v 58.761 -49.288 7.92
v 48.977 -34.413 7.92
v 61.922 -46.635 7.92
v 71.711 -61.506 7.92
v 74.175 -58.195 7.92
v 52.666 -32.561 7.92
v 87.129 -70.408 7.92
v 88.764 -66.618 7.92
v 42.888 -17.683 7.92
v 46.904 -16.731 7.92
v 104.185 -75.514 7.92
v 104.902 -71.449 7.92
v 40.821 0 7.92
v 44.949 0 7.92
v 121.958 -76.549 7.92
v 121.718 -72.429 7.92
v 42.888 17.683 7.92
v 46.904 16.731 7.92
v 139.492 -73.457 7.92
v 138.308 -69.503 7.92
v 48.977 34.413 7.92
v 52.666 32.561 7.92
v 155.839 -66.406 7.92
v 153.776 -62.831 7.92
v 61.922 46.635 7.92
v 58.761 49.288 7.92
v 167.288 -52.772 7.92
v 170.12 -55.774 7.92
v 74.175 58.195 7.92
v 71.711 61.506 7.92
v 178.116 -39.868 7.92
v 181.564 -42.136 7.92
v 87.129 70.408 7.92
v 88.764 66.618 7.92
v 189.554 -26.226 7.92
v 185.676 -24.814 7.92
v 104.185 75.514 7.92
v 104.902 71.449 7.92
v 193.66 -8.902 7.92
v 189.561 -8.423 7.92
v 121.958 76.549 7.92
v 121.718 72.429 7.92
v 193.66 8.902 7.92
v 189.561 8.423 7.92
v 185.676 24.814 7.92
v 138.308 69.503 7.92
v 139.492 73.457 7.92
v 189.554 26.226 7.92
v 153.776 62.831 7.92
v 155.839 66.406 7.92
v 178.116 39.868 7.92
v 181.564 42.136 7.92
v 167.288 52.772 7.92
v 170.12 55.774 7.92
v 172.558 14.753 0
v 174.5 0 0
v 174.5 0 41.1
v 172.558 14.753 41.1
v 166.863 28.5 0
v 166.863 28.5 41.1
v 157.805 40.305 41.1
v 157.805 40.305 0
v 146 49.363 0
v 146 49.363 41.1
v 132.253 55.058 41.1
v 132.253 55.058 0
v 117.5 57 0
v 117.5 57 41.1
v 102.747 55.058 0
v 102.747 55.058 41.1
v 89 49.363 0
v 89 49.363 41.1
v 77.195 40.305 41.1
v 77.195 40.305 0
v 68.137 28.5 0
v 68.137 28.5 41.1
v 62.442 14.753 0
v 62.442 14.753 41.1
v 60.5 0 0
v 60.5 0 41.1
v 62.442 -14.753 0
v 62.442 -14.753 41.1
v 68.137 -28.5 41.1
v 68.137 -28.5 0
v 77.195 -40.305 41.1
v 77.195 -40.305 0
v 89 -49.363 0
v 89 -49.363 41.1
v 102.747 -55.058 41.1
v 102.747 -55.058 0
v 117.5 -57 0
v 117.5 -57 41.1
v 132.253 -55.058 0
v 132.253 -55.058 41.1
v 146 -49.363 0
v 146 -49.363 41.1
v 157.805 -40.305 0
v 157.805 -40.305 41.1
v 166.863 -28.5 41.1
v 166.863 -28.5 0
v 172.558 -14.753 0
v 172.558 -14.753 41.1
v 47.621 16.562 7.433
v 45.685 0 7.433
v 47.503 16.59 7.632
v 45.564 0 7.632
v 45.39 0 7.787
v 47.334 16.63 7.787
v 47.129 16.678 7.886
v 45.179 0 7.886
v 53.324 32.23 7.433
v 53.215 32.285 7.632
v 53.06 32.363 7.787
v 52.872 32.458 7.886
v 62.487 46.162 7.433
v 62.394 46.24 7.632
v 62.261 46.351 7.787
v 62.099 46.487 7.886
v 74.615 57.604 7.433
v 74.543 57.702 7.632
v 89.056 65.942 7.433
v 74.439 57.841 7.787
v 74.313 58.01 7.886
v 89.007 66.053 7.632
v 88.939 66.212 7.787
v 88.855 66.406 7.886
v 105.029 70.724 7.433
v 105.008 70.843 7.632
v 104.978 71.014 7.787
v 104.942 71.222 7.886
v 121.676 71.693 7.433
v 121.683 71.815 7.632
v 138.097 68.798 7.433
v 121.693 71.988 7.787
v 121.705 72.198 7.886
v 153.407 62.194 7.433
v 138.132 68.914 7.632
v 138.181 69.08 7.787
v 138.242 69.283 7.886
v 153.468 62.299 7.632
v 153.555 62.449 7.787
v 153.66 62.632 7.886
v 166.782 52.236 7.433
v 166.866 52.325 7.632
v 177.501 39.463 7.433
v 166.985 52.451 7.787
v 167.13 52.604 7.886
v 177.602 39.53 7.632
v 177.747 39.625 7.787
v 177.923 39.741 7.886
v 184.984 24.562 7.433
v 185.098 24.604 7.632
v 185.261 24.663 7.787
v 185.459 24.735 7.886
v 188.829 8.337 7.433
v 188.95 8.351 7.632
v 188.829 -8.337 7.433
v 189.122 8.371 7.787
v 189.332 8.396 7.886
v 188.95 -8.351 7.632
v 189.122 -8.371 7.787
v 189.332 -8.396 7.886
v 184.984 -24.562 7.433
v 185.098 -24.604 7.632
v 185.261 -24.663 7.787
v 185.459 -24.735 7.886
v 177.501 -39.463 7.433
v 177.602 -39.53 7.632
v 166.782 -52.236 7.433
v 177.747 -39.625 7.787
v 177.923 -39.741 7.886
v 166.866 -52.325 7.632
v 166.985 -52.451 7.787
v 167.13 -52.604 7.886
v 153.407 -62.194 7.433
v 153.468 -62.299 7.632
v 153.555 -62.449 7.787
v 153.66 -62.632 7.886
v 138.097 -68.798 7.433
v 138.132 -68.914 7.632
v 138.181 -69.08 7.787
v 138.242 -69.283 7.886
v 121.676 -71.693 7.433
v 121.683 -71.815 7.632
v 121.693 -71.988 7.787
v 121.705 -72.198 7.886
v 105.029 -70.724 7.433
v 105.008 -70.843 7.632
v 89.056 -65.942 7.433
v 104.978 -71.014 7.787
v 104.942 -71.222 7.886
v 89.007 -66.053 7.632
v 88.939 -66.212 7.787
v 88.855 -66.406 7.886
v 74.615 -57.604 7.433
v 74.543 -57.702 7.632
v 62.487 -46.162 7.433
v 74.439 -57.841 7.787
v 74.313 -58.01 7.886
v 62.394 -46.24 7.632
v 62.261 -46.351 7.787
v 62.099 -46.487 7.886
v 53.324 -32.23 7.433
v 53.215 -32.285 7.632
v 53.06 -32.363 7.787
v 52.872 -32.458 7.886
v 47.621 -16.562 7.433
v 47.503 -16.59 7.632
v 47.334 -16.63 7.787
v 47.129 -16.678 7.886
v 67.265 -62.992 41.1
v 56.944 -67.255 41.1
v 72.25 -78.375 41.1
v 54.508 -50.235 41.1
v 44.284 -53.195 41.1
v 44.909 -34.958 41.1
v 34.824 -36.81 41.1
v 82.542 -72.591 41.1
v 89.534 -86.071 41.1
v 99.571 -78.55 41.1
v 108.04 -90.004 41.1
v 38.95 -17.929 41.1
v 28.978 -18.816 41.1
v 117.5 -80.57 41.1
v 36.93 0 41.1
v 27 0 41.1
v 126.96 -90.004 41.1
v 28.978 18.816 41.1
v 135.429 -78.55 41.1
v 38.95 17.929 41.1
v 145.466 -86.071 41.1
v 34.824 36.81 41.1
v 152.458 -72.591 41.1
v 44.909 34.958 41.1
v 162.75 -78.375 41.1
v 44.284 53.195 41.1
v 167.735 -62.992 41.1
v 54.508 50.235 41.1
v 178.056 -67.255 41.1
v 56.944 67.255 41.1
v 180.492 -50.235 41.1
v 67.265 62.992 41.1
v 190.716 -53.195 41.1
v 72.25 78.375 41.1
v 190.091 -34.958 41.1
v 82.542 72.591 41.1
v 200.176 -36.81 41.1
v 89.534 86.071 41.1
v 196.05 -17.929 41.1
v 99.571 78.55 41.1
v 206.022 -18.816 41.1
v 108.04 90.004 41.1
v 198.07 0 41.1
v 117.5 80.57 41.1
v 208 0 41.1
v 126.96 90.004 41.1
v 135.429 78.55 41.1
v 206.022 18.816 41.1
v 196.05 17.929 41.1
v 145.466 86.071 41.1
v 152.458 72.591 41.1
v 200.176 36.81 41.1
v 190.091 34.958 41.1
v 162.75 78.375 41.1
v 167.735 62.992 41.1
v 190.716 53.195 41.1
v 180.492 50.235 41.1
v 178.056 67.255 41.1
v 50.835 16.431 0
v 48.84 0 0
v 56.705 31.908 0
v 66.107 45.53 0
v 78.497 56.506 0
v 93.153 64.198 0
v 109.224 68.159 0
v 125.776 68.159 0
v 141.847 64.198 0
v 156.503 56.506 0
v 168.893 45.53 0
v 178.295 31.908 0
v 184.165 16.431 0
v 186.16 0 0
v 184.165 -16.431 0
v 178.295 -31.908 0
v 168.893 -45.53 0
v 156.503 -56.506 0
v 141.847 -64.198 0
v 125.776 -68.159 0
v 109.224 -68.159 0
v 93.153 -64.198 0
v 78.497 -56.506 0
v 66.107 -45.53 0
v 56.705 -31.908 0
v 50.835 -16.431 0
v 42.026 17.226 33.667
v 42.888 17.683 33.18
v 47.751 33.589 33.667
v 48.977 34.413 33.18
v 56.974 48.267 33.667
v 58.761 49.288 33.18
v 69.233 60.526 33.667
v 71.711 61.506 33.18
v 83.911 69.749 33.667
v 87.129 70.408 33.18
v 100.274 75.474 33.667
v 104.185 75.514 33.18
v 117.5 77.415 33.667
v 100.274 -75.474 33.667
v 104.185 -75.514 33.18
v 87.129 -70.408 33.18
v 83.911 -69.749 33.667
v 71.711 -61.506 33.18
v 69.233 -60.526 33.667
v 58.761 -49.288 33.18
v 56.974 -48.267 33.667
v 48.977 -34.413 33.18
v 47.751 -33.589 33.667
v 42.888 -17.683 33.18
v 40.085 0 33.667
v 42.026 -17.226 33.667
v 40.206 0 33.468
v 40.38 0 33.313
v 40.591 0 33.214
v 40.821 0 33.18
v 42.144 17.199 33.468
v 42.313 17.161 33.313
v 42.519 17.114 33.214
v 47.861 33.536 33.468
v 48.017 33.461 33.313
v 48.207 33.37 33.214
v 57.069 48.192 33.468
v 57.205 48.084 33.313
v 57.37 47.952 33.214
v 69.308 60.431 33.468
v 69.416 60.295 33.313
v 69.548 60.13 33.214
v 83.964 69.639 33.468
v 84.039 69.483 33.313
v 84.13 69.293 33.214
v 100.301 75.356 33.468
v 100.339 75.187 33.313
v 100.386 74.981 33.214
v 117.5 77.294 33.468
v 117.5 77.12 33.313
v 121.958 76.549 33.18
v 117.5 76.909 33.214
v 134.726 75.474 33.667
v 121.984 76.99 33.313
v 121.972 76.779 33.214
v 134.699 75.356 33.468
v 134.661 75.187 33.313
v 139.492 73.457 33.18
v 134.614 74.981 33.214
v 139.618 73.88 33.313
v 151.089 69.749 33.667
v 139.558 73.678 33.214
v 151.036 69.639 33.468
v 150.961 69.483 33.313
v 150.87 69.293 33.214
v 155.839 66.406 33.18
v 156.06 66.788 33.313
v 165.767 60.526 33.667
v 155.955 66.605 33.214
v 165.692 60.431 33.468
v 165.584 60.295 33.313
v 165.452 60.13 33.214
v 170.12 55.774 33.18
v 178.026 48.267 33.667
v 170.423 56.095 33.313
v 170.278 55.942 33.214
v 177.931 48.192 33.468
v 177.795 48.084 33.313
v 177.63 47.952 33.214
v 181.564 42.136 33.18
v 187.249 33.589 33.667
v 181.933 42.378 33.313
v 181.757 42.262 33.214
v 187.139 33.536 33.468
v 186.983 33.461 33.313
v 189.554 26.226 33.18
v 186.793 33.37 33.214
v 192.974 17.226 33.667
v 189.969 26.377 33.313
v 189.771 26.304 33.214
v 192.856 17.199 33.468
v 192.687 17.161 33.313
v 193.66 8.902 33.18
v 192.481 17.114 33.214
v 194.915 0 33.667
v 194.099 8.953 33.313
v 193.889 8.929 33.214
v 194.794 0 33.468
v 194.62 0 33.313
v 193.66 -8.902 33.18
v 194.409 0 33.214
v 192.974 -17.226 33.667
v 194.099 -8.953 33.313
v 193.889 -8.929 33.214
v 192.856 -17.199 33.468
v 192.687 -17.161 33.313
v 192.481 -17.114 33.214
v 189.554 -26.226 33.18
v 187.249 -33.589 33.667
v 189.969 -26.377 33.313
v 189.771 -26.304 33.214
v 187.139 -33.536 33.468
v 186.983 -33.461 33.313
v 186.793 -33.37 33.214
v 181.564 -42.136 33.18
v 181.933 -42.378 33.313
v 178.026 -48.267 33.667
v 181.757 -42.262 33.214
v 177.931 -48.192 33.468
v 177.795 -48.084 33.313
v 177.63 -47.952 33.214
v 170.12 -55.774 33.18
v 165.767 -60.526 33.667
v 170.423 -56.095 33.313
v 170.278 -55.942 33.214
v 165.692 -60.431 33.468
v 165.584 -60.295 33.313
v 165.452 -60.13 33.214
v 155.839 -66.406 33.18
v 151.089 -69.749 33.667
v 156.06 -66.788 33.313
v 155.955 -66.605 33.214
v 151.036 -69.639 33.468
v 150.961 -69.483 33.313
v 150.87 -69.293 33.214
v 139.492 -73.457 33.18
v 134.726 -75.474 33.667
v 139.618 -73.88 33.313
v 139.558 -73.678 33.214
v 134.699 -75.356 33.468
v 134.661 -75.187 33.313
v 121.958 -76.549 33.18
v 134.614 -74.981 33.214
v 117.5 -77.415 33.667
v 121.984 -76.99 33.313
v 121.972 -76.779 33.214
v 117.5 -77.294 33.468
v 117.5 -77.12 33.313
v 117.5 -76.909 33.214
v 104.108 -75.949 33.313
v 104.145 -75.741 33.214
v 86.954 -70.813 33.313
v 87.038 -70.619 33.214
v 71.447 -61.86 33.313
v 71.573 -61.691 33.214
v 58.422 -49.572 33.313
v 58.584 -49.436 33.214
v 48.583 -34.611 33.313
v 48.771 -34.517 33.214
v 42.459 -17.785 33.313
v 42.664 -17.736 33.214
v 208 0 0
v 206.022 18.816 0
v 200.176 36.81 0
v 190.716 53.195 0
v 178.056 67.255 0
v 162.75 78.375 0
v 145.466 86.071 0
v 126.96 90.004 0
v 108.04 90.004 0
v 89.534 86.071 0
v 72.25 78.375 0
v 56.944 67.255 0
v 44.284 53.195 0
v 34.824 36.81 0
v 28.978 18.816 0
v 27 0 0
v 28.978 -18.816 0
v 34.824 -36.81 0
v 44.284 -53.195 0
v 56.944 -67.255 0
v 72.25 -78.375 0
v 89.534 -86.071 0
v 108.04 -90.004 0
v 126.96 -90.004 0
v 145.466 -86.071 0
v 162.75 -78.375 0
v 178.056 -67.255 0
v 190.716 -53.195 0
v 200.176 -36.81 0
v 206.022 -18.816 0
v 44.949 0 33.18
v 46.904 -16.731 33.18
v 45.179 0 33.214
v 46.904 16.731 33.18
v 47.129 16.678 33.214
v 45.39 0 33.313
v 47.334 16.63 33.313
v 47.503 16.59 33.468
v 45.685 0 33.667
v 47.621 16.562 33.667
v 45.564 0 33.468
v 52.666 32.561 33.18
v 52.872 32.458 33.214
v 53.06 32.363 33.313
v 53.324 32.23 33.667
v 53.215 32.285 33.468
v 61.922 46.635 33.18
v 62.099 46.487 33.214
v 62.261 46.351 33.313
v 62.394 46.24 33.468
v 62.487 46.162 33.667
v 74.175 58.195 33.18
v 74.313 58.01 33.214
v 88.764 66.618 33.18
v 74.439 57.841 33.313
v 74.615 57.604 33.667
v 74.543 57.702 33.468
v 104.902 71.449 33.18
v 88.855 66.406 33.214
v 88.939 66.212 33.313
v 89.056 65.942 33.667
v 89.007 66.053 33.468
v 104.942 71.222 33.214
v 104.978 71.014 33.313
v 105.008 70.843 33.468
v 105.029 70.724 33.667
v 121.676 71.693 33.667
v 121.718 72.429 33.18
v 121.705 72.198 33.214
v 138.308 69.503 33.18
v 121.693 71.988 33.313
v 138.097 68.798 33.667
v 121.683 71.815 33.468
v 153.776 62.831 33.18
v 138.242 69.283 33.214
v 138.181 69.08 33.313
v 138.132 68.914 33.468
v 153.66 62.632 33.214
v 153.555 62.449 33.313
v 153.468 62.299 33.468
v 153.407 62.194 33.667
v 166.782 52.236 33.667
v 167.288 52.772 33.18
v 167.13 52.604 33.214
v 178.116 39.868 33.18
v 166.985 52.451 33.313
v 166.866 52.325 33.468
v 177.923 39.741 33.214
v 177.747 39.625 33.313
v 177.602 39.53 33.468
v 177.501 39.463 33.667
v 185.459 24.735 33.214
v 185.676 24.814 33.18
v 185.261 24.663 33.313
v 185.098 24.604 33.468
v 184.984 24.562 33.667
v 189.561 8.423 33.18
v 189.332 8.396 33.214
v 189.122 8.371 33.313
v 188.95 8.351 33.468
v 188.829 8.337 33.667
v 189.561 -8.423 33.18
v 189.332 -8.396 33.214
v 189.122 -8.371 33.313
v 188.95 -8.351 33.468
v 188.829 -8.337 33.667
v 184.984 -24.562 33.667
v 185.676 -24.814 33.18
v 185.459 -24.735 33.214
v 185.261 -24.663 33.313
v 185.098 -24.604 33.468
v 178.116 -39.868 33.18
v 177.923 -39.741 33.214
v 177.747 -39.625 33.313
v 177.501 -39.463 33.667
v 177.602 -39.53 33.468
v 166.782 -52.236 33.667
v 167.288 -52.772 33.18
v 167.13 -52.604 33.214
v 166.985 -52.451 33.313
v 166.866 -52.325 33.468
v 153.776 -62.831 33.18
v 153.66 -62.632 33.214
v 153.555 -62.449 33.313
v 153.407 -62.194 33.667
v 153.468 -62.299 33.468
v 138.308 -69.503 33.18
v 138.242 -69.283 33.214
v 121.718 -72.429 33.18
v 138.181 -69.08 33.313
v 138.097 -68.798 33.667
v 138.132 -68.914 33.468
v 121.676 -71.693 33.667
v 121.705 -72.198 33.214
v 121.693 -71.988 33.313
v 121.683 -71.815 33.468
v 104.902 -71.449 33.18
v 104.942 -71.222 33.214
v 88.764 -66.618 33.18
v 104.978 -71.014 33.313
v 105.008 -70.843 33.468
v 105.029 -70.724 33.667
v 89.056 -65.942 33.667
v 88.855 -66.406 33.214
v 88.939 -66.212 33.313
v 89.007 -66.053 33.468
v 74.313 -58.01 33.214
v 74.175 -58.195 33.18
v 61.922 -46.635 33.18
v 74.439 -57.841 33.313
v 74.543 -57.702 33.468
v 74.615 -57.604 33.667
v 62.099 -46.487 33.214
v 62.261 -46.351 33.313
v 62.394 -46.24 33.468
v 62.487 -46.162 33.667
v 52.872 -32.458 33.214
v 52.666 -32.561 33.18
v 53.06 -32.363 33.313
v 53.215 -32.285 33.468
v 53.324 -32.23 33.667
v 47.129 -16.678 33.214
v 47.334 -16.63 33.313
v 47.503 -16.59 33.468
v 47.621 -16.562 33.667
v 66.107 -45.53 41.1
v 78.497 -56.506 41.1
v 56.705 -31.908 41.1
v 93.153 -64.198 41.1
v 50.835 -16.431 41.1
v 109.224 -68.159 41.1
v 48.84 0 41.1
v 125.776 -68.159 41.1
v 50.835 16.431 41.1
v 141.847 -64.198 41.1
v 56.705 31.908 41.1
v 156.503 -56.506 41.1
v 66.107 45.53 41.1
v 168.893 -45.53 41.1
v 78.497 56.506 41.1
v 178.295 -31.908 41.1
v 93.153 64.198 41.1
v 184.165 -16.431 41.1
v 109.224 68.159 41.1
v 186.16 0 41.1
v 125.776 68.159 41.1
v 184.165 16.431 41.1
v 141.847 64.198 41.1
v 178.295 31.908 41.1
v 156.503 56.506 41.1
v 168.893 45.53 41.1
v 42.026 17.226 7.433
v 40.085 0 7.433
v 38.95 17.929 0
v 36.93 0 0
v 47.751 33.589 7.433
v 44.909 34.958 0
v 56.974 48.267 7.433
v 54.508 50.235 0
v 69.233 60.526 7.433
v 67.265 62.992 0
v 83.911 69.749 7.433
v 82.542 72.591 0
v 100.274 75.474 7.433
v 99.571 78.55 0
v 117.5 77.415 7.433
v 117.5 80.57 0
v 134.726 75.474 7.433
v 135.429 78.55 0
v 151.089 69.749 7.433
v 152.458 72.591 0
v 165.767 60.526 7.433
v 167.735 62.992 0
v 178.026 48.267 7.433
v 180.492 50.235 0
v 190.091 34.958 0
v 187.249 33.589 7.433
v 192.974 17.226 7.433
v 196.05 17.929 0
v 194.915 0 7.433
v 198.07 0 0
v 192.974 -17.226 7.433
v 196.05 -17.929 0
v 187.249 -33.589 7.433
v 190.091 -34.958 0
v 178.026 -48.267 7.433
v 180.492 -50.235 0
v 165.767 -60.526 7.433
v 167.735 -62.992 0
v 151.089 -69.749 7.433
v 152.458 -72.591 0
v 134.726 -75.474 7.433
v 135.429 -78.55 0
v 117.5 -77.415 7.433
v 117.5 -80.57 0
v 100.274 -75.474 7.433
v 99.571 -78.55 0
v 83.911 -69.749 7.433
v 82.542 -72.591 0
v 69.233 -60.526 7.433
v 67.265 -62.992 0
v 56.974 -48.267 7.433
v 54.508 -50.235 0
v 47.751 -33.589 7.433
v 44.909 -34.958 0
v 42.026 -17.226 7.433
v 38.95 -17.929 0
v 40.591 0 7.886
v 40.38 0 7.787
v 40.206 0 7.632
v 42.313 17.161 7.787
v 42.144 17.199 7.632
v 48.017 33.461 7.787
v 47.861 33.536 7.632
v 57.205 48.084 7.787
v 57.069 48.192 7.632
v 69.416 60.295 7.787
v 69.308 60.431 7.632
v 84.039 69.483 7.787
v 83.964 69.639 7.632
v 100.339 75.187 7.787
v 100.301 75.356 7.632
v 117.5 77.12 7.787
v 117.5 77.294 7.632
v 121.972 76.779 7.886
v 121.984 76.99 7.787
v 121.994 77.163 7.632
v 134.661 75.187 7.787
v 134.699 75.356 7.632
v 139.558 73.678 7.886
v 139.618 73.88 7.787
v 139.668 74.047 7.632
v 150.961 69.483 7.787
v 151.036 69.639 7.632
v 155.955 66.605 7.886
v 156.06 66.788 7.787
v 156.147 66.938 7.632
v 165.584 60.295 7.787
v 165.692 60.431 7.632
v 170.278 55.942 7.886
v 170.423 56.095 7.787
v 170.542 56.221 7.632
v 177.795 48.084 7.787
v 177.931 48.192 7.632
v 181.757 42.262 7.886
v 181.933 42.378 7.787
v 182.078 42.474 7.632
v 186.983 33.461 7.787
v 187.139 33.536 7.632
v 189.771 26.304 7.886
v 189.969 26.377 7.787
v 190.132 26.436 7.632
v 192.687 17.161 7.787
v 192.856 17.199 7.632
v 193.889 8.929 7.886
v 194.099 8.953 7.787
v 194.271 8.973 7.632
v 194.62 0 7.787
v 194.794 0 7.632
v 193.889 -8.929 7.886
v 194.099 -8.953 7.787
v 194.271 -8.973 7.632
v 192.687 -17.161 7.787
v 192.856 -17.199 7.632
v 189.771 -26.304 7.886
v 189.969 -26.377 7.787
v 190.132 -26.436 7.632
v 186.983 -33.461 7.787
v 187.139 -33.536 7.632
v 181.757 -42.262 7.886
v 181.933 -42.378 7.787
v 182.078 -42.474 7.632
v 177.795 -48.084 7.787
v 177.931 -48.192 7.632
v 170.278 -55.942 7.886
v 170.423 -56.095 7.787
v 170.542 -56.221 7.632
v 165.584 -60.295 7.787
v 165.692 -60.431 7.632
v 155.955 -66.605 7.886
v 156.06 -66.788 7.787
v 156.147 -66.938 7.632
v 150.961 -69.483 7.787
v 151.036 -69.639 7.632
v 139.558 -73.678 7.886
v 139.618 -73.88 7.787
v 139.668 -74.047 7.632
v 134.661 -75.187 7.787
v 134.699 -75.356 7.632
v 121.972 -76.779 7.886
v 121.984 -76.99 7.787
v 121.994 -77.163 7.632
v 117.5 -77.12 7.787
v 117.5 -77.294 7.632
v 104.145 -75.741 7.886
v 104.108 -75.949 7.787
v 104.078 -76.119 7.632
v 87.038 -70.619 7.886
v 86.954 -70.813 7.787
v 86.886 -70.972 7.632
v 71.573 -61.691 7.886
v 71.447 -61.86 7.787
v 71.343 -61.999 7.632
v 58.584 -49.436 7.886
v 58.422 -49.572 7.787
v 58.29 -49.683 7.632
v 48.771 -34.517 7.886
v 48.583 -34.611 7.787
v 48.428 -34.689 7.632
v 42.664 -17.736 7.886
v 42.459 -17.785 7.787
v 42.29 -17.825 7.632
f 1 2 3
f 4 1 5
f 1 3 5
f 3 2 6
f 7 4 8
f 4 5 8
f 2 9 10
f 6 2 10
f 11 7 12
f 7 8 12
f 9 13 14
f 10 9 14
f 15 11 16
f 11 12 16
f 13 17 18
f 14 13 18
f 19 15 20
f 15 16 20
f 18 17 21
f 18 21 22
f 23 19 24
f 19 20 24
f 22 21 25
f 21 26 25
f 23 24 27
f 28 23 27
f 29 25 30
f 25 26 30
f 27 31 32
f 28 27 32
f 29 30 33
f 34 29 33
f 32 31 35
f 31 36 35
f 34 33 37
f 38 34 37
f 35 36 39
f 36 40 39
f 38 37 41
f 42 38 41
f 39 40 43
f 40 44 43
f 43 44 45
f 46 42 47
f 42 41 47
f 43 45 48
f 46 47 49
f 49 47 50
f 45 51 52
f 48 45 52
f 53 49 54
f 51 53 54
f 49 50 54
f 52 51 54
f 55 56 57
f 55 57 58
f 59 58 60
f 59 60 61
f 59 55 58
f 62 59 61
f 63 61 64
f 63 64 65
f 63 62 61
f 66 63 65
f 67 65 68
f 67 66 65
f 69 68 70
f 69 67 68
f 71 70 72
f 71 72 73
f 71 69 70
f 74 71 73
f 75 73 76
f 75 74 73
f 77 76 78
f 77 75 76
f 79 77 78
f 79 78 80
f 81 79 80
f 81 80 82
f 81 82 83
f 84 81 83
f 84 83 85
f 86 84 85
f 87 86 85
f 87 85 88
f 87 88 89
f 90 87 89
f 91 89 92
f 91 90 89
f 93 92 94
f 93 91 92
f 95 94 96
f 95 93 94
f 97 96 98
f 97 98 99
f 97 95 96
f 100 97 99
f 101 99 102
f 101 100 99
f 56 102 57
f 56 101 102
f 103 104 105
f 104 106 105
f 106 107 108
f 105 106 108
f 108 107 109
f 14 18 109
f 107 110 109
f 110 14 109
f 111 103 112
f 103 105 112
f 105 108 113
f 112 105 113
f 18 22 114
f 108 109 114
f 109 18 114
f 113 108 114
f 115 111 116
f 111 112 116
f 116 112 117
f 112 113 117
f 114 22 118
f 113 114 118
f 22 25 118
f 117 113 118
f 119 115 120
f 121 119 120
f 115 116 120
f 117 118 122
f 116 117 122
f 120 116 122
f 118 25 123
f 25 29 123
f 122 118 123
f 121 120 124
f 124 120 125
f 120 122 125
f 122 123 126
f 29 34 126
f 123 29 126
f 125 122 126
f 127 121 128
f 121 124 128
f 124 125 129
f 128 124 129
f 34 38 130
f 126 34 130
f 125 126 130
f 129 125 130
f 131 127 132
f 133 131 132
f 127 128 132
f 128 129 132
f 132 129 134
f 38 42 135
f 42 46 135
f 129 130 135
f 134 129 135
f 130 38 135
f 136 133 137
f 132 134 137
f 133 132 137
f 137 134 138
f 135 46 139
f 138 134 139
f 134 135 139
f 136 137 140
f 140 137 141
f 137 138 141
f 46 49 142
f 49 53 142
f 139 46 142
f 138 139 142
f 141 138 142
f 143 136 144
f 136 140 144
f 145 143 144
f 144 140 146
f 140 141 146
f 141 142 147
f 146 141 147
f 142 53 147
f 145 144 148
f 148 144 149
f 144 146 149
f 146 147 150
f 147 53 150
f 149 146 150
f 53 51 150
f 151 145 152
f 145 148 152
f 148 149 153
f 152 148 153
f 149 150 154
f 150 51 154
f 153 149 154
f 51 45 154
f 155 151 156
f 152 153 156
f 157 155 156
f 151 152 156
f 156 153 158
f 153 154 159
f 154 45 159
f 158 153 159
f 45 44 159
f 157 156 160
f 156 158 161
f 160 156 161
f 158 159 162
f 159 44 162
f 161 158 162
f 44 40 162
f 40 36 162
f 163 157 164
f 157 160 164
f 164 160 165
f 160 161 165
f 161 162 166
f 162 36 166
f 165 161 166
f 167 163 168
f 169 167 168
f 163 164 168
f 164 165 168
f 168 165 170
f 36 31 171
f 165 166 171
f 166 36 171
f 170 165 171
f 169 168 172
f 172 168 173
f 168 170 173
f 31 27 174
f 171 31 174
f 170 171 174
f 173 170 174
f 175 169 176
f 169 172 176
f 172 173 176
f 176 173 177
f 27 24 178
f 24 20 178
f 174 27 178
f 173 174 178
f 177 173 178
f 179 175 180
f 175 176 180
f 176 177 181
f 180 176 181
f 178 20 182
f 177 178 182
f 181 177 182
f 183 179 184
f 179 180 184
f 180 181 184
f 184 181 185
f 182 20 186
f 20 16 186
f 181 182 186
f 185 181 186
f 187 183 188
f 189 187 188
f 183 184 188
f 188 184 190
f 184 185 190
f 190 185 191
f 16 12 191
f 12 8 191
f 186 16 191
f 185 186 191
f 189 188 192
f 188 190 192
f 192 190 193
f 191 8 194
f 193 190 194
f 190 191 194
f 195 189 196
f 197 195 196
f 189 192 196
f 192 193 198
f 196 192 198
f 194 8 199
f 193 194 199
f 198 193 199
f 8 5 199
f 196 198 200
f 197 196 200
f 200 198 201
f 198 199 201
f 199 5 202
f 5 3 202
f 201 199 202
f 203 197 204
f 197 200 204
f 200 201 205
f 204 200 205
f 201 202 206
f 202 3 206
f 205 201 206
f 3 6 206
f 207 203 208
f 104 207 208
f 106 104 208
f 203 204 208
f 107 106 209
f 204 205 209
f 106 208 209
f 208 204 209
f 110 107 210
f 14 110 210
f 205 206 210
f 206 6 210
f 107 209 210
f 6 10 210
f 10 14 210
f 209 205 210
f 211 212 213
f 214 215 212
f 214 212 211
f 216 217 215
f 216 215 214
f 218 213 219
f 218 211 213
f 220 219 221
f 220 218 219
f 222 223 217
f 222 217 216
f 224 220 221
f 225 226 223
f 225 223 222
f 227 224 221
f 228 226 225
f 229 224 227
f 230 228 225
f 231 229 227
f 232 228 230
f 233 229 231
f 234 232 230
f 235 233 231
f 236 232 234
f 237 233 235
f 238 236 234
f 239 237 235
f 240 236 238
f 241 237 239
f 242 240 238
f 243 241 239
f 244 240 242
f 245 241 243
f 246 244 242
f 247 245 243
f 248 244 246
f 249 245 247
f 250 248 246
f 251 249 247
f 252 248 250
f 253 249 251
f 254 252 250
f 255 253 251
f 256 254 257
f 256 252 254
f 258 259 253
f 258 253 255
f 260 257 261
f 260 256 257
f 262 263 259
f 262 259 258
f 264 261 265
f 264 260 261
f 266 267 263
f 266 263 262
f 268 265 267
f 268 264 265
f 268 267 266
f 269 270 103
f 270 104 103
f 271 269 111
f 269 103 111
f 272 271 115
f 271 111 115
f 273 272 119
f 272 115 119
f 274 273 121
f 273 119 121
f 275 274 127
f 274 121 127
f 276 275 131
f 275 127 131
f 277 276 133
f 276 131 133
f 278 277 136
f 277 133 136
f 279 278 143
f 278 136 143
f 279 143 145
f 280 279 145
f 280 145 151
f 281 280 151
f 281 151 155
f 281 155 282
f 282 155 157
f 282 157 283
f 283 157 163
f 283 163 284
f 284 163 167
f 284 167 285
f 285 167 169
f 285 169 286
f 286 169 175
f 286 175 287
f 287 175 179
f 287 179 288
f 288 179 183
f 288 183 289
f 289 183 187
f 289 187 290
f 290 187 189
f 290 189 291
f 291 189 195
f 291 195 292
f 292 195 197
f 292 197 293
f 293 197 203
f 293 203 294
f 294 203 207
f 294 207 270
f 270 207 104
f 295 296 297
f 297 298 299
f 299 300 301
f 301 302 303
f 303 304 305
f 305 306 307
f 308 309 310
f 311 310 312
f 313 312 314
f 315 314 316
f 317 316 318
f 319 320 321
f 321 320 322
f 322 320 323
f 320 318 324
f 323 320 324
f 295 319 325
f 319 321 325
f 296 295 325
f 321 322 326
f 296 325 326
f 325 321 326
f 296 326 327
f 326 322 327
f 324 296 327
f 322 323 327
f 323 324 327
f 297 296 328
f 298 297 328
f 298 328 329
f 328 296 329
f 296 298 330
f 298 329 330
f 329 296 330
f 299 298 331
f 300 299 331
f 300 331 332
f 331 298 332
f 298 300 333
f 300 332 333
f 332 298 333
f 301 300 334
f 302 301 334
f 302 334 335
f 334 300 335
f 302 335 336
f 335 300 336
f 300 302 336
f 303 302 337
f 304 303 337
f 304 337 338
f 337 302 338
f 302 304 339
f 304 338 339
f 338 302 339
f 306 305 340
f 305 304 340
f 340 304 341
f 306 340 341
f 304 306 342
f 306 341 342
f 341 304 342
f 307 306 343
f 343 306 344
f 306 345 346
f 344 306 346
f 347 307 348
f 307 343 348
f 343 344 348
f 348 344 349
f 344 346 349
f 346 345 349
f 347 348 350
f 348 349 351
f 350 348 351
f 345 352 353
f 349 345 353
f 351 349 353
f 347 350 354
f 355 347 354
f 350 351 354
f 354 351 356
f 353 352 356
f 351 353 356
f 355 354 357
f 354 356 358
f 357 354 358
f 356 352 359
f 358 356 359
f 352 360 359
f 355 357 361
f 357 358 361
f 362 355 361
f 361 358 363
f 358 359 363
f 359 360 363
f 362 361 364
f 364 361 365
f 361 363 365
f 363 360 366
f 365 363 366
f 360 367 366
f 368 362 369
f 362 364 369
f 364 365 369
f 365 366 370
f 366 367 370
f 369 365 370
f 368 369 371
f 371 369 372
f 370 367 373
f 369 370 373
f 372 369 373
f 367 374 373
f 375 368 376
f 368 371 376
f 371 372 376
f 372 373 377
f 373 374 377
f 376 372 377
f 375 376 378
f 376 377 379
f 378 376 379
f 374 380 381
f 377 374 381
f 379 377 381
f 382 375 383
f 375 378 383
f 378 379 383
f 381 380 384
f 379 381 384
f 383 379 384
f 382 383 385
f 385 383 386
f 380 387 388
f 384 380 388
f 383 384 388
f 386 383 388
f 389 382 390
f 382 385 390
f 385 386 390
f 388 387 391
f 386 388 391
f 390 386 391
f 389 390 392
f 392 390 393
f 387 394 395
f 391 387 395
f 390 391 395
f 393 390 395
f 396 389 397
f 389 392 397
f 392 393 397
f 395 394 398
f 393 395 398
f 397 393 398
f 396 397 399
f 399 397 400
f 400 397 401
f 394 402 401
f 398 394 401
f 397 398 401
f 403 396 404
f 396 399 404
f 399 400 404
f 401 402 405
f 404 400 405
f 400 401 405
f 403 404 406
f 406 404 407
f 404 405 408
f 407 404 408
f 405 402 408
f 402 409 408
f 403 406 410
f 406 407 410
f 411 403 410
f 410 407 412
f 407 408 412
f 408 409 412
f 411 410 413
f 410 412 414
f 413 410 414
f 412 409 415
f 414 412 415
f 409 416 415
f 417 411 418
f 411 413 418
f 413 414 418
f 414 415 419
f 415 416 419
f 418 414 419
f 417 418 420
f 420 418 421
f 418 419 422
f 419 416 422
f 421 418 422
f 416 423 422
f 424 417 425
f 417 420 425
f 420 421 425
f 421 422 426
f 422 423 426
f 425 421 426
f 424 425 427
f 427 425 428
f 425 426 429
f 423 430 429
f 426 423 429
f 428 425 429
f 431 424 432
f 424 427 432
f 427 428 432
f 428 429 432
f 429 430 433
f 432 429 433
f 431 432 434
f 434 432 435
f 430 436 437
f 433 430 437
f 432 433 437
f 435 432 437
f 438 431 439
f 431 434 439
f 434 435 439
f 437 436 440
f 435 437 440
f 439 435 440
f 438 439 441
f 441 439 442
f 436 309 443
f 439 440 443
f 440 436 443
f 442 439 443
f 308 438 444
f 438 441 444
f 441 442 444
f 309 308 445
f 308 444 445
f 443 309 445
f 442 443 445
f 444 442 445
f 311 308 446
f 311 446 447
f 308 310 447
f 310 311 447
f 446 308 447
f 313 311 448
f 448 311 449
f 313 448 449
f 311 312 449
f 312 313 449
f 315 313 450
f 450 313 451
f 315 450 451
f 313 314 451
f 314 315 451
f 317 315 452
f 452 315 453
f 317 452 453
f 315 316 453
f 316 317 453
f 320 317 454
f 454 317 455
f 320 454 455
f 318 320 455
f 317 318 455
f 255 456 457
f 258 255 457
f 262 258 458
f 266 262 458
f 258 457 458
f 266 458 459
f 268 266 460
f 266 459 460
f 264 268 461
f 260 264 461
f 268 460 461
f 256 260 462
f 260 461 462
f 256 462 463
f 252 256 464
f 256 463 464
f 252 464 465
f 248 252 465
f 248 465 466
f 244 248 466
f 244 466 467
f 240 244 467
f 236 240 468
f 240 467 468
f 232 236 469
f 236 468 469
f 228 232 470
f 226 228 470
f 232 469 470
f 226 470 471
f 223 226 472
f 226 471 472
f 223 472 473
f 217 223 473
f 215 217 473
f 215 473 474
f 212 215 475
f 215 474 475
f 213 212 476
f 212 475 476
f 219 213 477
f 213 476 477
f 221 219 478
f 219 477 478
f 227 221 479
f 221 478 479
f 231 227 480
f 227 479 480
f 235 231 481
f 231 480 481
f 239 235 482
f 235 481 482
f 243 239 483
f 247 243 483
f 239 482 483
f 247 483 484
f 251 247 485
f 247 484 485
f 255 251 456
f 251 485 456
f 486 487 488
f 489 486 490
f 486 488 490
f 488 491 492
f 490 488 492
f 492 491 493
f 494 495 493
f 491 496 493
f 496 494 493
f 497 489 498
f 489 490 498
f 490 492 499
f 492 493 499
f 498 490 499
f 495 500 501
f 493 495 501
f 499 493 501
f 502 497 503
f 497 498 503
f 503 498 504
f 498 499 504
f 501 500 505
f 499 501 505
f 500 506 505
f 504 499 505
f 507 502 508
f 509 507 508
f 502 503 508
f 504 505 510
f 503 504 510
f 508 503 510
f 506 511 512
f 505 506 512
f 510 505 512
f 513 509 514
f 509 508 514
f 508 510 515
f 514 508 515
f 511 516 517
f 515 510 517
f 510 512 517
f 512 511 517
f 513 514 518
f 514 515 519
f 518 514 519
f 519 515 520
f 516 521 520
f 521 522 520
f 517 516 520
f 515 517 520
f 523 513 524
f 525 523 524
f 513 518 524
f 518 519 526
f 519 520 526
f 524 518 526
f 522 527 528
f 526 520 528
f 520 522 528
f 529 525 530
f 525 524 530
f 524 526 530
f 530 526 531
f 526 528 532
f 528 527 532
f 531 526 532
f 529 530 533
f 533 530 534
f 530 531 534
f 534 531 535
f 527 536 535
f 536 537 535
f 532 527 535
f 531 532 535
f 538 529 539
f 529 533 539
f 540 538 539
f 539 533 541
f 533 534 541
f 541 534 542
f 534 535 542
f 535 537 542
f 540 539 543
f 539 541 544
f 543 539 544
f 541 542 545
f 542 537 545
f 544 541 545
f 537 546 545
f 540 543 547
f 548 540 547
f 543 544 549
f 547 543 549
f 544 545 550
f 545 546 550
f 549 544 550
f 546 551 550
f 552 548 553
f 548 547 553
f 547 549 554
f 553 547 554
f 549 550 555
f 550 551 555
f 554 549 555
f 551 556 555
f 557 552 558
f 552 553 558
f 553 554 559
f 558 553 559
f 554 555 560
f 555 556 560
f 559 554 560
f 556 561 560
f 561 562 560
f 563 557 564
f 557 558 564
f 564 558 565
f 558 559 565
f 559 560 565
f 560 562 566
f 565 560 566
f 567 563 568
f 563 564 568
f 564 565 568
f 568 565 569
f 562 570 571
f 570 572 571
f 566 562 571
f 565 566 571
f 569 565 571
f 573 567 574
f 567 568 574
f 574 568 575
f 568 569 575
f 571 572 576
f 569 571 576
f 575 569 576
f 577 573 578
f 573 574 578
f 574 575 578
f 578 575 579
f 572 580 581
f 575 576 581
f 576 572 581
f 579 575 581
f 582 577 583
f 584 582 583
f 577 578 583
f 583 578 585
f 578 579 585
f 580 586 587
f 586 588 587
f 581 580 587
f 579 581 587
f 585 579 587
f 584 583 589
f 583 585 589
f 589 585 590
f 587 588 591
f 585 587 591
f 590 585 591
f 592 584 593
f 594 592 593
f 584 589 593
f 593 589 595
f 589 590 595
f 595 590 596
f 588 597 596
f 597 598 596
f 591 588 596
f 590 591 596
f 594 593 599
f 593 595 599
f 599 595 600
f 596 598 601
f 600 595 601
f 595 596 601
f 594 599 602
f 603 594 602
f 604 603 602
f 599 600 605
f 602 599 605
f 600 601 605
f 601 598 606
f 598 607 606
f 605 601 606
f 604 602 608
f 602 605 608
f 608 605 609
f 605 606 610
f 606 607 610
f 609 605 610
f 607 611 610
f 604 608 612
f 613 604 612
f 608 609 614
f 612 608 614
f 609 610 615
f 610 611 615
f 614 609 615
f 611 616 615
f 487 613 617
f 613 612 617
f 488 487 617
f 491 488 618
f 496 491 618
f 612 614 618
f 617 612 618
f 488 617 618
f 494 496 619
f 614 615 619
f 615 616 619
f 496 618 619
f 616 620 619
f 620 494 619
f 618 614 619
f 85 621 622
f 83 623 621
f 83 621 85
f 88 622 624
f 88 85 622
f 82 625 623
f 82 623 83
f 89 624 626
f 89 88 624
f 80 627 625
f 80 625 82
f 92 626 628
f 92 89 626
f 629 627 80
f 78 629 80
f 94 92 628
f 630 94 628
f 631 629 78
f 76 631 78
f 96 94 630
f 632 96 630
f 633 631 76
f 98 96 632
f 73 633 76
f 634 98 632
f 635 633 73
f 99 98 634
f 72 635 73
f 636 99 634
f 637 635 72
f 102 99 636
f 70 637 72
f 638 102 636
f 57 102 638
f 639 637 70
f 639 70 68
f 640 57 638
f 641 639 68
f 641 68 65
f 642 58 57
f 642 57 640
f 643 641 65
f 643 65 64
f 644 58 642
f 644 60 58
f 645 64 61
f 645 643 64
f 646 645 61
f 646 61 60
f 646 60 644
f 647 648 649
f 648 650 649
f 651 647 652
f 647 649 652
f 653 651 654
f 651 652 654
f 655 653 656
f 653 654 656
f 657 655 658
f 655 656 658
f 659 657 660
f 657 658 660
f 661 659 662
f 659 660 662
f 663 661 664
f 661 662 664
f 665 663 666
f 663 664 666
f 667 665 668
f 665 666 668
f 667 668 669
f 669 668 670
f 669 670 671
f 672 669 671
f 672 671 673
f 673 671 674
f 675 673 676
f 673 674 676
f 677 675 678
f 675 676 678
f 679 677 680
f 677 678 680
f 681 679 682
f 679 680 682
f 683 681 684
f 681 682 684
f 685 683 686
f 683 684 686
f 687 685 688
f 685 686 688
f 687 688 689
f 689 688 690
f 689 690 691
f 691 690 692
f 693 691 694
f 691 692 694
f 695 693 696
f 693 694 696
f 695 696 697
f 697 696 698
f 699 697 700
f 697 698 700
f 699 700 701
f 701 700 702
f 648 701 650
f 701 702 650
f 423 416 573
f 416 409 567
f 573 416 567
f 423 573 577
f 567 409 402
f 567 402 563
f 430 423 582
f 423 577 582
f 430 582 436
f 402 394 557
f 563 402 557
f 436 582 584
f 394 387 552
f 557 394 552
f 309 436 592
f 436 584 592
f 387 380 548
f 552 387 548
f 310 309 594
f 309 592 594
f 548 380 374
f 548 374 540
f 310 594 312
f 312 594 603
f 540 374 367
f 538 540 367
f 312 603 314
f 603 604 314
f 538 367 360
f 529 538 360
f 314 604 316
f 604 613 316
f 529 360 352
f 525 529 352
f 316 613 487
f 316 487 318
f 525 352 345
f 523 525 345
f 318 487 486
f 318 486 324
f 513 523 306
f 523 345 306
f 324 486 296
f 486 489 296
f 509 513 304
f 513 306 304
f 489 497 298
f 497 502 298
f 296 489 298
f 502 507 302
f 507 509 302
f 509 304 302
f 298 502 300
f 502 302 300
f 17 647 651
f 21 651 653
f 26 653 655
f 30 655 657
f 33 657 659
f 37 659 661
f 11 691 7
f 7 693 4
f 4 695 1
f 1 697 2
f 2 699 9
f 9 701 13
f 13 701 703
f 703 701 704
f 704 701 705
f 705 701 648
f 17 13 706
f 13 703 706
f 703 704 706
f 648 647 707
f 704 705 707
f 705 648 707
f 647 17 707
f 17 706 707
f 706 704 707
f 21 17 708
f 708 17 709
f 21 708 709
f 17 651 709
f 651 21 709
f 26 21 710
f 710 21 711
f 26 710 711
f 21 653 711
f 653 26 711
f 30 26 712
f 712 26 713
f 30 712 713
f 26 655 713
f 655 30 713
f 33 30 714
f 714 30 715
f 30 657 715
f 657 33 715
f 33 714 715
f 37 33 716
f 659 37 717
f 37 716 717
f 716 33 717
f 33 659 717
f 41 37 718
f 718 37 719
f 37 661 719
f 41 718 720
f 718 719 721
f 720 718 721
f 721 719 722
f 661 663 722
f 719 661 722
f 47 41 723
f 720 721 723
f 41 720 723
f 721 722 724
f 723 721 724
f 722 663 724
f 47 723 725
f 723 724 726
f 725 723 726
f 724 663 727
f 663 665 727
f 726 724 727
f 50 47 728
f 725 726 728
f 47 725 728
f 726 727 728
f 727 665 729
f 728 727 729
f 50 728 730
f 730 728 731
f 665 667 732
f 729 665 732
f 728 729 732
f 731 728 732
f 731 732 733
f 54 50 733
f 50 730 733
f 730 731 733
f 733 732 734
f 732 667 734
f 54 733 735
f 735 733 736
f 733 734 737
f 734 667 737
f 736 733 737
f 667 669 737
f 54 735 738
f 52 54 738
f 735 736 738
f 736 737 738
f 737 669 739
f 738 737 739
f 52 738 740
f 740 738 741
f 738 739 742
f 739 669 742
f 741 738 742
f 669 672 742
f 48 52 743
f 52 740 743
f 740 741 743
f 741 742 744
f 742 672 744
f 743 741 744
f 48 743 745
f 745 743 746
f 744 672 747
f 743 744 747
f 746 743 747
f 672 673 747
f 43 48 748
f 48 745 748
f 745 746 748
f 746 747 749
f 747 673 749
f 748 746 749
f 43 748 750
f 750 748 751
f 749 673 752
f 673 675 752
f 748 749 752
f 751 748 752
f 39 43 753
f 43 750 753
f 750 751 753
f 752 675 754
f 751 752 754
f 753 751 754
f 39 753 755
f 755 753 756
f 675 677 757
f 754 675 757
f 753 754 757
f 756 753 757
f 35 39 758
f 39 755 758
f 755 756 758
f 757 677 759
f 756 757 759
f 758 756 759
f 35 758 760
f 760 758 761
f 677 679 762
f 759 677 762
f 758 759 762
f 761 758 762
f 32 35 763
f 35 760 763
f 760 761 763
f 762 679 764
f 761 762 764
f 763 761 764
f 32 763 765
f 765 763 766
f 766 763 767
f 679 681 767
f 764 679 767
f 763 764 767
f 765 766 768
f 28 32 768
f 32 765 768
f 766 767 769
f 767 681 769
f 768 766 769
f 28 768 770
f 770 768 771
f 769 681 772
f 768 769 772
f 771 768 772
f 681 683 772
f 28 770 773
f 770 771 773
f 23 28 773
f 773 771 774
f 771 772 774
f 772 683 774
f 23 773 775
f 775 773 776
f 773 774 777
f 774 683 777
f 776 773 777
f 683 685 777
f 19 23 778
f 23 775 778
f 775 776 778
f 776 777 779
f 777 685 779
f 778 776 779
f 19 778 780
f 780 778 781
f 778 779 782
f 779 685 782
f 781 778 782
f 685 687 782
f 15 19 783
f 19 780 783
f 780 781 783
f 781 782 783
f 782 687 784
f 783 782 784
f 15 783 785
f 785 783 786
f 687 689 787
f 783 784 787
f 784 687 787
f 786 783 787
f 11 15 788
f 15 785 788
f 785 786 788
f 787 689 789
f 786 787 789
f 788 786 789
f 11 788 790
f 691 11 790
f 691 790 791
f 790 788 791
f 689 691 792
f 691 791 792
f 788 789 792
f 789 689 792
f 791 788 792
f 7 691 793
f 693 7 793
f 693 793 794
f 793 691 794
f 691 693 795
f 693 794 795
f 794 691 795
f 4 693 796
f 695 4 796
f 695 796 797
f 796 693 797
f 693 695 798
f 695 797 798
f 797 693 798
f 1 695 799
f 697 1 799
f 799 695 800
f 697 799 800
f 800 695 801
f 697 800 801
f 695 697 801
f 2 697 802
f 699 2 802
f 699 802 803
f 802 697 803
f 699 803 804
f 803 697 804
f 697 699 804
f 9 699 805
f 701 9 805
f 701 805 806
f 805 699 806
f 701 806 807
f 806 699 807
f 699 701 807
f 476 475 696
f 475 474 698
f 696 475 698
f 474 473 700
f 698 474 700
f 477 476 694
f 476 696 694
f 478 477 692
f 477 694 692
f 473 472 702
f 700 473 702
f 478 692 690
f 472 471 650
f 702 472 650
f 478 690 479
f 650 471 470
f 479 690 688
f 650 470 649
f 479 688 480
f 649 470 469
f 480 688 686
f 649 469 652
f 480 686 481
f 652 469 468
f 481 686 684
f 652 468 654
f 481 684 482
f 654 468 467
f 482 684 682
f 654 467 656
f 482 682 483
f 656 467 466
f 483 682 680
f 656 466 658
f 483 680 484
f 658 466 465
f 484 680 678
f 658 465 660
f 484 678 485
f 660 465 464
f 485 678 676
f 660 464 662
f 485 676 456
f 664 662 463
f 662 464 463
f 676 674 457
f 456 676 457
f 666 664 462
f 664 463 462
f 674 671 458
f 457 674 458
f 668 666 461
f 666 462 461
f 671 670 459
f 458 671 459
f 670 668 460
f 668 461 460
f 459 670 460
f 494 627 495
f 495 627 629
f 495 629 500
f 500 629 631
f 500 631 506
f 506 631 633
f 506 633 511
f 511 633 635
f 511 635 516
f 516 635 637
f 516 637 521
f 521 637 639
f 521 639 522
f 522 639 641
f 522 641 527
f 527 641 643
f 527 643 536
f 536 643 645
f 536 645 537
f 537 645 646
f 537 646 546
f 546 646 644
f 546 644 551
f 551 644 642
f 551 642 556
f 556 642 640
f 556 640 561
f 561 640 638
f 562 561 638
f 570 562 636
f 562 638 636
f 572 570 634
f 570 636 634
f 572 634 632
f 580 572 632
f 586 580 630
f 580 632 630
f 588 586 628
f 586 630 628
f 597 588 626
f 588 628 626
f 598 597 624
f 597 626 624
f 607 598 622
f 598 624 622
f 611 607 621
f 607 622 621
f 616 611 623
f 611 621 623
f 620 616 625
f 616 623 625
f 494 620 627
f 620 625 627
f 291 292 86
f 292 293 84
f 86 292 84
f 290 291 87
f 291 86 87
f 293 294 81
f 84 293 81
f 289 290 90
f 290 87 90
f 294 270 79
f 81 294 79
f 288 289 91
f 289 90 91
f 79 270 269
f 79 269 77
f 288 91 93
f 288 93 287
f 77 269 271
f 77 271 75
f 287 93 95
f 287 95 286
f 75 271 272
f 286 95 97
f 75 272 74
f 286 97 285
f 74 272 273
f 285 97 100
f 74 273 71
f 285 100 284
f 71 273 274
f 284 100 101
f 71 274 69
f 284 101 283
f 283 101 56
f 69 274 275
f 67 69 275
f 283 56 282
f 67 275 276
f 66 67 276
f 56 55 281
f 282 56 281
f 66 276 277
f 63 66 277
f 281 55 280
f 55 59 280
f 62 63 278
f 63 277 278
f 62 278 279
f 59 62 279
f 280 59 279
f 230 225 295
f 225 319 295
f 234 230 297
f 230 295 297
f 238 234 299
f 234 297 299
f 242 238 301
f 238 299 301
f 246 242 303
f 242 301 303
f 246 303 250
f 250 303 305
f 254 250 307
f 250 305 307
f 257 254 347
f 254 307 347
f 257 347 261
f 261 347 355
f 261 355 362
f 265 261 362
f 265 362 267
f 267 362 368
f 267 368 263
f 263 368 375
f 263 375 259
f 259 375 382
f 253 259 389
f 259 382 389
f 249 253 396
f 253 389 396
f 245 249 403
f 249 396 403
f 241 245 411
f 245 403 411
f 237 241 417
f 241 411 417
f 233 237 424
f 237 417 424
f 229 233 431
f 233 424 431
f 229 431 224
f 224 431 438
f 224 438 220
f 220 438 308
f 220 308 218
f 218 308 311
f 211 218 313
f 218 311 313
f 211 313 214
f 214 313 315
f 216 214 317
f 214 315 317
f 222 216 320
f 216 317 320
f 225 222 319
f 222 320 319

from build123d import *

# Parameters (mm, degrees)
F0_R     = 90.5
F0_R_2   = 57
F1_DEPTH = 41.1


with BuildPart() as f1:
    # F0 (on Top) → F1 (new body)
    with BuildSketch(Plane.XY):
        with Locations((117.5, 0)):
            Circle(F0_R)
        with Locations((117.5, 0)):
            Circle(F0_R_2, mode=Mode.SUBTRACT)
    extrude(amount=F1_DEPTH)

    # F2 (on Front) → F3 (revolve, cut)
    with BuildSketch(Plane.XZ):
        with BuildLine():
            Line((45.685055, 33.667415), (48.84, 41.1))
            Line((48.84, 41.1), (36.93, 41.1))
            Line((36.93, 41.1), (40.084945, 33.667415))
            ThreePointArc((40.084945, 33.667415), (40.379799, 33.312891), (40.821349, 33.18))
            Line((40.821349, 33.18), (44.948651, 33.18))
            ThreePointArc((44.948651, 33.18), (45.390201, 33.312891), (45.685055, 33.667415))
        make_face()
        with BuildLine():
            ThreePointArc((45.685055, 7.432585), (45.390201, 7.787109), (44.948651, 7.92))
            Line((44.948651, 7.92), (40.821349, 7.92))
            ThreePointArc((40.821349, 7.92), (40.379799, 7.787109), (40.084945, 7.432585))
            Line((40.084945, 7.432585), (36.93, 0))
            Line((36.93, 0), (48.84, 0))
            Line((48.84, 0), (45.685055, 7.432585))
        make_face()
    revolve(axis=Axis((117.5, 0, 20.55), (0, 0, -1)), mode=Mode.SUBTRACT)


solid = f1.part
